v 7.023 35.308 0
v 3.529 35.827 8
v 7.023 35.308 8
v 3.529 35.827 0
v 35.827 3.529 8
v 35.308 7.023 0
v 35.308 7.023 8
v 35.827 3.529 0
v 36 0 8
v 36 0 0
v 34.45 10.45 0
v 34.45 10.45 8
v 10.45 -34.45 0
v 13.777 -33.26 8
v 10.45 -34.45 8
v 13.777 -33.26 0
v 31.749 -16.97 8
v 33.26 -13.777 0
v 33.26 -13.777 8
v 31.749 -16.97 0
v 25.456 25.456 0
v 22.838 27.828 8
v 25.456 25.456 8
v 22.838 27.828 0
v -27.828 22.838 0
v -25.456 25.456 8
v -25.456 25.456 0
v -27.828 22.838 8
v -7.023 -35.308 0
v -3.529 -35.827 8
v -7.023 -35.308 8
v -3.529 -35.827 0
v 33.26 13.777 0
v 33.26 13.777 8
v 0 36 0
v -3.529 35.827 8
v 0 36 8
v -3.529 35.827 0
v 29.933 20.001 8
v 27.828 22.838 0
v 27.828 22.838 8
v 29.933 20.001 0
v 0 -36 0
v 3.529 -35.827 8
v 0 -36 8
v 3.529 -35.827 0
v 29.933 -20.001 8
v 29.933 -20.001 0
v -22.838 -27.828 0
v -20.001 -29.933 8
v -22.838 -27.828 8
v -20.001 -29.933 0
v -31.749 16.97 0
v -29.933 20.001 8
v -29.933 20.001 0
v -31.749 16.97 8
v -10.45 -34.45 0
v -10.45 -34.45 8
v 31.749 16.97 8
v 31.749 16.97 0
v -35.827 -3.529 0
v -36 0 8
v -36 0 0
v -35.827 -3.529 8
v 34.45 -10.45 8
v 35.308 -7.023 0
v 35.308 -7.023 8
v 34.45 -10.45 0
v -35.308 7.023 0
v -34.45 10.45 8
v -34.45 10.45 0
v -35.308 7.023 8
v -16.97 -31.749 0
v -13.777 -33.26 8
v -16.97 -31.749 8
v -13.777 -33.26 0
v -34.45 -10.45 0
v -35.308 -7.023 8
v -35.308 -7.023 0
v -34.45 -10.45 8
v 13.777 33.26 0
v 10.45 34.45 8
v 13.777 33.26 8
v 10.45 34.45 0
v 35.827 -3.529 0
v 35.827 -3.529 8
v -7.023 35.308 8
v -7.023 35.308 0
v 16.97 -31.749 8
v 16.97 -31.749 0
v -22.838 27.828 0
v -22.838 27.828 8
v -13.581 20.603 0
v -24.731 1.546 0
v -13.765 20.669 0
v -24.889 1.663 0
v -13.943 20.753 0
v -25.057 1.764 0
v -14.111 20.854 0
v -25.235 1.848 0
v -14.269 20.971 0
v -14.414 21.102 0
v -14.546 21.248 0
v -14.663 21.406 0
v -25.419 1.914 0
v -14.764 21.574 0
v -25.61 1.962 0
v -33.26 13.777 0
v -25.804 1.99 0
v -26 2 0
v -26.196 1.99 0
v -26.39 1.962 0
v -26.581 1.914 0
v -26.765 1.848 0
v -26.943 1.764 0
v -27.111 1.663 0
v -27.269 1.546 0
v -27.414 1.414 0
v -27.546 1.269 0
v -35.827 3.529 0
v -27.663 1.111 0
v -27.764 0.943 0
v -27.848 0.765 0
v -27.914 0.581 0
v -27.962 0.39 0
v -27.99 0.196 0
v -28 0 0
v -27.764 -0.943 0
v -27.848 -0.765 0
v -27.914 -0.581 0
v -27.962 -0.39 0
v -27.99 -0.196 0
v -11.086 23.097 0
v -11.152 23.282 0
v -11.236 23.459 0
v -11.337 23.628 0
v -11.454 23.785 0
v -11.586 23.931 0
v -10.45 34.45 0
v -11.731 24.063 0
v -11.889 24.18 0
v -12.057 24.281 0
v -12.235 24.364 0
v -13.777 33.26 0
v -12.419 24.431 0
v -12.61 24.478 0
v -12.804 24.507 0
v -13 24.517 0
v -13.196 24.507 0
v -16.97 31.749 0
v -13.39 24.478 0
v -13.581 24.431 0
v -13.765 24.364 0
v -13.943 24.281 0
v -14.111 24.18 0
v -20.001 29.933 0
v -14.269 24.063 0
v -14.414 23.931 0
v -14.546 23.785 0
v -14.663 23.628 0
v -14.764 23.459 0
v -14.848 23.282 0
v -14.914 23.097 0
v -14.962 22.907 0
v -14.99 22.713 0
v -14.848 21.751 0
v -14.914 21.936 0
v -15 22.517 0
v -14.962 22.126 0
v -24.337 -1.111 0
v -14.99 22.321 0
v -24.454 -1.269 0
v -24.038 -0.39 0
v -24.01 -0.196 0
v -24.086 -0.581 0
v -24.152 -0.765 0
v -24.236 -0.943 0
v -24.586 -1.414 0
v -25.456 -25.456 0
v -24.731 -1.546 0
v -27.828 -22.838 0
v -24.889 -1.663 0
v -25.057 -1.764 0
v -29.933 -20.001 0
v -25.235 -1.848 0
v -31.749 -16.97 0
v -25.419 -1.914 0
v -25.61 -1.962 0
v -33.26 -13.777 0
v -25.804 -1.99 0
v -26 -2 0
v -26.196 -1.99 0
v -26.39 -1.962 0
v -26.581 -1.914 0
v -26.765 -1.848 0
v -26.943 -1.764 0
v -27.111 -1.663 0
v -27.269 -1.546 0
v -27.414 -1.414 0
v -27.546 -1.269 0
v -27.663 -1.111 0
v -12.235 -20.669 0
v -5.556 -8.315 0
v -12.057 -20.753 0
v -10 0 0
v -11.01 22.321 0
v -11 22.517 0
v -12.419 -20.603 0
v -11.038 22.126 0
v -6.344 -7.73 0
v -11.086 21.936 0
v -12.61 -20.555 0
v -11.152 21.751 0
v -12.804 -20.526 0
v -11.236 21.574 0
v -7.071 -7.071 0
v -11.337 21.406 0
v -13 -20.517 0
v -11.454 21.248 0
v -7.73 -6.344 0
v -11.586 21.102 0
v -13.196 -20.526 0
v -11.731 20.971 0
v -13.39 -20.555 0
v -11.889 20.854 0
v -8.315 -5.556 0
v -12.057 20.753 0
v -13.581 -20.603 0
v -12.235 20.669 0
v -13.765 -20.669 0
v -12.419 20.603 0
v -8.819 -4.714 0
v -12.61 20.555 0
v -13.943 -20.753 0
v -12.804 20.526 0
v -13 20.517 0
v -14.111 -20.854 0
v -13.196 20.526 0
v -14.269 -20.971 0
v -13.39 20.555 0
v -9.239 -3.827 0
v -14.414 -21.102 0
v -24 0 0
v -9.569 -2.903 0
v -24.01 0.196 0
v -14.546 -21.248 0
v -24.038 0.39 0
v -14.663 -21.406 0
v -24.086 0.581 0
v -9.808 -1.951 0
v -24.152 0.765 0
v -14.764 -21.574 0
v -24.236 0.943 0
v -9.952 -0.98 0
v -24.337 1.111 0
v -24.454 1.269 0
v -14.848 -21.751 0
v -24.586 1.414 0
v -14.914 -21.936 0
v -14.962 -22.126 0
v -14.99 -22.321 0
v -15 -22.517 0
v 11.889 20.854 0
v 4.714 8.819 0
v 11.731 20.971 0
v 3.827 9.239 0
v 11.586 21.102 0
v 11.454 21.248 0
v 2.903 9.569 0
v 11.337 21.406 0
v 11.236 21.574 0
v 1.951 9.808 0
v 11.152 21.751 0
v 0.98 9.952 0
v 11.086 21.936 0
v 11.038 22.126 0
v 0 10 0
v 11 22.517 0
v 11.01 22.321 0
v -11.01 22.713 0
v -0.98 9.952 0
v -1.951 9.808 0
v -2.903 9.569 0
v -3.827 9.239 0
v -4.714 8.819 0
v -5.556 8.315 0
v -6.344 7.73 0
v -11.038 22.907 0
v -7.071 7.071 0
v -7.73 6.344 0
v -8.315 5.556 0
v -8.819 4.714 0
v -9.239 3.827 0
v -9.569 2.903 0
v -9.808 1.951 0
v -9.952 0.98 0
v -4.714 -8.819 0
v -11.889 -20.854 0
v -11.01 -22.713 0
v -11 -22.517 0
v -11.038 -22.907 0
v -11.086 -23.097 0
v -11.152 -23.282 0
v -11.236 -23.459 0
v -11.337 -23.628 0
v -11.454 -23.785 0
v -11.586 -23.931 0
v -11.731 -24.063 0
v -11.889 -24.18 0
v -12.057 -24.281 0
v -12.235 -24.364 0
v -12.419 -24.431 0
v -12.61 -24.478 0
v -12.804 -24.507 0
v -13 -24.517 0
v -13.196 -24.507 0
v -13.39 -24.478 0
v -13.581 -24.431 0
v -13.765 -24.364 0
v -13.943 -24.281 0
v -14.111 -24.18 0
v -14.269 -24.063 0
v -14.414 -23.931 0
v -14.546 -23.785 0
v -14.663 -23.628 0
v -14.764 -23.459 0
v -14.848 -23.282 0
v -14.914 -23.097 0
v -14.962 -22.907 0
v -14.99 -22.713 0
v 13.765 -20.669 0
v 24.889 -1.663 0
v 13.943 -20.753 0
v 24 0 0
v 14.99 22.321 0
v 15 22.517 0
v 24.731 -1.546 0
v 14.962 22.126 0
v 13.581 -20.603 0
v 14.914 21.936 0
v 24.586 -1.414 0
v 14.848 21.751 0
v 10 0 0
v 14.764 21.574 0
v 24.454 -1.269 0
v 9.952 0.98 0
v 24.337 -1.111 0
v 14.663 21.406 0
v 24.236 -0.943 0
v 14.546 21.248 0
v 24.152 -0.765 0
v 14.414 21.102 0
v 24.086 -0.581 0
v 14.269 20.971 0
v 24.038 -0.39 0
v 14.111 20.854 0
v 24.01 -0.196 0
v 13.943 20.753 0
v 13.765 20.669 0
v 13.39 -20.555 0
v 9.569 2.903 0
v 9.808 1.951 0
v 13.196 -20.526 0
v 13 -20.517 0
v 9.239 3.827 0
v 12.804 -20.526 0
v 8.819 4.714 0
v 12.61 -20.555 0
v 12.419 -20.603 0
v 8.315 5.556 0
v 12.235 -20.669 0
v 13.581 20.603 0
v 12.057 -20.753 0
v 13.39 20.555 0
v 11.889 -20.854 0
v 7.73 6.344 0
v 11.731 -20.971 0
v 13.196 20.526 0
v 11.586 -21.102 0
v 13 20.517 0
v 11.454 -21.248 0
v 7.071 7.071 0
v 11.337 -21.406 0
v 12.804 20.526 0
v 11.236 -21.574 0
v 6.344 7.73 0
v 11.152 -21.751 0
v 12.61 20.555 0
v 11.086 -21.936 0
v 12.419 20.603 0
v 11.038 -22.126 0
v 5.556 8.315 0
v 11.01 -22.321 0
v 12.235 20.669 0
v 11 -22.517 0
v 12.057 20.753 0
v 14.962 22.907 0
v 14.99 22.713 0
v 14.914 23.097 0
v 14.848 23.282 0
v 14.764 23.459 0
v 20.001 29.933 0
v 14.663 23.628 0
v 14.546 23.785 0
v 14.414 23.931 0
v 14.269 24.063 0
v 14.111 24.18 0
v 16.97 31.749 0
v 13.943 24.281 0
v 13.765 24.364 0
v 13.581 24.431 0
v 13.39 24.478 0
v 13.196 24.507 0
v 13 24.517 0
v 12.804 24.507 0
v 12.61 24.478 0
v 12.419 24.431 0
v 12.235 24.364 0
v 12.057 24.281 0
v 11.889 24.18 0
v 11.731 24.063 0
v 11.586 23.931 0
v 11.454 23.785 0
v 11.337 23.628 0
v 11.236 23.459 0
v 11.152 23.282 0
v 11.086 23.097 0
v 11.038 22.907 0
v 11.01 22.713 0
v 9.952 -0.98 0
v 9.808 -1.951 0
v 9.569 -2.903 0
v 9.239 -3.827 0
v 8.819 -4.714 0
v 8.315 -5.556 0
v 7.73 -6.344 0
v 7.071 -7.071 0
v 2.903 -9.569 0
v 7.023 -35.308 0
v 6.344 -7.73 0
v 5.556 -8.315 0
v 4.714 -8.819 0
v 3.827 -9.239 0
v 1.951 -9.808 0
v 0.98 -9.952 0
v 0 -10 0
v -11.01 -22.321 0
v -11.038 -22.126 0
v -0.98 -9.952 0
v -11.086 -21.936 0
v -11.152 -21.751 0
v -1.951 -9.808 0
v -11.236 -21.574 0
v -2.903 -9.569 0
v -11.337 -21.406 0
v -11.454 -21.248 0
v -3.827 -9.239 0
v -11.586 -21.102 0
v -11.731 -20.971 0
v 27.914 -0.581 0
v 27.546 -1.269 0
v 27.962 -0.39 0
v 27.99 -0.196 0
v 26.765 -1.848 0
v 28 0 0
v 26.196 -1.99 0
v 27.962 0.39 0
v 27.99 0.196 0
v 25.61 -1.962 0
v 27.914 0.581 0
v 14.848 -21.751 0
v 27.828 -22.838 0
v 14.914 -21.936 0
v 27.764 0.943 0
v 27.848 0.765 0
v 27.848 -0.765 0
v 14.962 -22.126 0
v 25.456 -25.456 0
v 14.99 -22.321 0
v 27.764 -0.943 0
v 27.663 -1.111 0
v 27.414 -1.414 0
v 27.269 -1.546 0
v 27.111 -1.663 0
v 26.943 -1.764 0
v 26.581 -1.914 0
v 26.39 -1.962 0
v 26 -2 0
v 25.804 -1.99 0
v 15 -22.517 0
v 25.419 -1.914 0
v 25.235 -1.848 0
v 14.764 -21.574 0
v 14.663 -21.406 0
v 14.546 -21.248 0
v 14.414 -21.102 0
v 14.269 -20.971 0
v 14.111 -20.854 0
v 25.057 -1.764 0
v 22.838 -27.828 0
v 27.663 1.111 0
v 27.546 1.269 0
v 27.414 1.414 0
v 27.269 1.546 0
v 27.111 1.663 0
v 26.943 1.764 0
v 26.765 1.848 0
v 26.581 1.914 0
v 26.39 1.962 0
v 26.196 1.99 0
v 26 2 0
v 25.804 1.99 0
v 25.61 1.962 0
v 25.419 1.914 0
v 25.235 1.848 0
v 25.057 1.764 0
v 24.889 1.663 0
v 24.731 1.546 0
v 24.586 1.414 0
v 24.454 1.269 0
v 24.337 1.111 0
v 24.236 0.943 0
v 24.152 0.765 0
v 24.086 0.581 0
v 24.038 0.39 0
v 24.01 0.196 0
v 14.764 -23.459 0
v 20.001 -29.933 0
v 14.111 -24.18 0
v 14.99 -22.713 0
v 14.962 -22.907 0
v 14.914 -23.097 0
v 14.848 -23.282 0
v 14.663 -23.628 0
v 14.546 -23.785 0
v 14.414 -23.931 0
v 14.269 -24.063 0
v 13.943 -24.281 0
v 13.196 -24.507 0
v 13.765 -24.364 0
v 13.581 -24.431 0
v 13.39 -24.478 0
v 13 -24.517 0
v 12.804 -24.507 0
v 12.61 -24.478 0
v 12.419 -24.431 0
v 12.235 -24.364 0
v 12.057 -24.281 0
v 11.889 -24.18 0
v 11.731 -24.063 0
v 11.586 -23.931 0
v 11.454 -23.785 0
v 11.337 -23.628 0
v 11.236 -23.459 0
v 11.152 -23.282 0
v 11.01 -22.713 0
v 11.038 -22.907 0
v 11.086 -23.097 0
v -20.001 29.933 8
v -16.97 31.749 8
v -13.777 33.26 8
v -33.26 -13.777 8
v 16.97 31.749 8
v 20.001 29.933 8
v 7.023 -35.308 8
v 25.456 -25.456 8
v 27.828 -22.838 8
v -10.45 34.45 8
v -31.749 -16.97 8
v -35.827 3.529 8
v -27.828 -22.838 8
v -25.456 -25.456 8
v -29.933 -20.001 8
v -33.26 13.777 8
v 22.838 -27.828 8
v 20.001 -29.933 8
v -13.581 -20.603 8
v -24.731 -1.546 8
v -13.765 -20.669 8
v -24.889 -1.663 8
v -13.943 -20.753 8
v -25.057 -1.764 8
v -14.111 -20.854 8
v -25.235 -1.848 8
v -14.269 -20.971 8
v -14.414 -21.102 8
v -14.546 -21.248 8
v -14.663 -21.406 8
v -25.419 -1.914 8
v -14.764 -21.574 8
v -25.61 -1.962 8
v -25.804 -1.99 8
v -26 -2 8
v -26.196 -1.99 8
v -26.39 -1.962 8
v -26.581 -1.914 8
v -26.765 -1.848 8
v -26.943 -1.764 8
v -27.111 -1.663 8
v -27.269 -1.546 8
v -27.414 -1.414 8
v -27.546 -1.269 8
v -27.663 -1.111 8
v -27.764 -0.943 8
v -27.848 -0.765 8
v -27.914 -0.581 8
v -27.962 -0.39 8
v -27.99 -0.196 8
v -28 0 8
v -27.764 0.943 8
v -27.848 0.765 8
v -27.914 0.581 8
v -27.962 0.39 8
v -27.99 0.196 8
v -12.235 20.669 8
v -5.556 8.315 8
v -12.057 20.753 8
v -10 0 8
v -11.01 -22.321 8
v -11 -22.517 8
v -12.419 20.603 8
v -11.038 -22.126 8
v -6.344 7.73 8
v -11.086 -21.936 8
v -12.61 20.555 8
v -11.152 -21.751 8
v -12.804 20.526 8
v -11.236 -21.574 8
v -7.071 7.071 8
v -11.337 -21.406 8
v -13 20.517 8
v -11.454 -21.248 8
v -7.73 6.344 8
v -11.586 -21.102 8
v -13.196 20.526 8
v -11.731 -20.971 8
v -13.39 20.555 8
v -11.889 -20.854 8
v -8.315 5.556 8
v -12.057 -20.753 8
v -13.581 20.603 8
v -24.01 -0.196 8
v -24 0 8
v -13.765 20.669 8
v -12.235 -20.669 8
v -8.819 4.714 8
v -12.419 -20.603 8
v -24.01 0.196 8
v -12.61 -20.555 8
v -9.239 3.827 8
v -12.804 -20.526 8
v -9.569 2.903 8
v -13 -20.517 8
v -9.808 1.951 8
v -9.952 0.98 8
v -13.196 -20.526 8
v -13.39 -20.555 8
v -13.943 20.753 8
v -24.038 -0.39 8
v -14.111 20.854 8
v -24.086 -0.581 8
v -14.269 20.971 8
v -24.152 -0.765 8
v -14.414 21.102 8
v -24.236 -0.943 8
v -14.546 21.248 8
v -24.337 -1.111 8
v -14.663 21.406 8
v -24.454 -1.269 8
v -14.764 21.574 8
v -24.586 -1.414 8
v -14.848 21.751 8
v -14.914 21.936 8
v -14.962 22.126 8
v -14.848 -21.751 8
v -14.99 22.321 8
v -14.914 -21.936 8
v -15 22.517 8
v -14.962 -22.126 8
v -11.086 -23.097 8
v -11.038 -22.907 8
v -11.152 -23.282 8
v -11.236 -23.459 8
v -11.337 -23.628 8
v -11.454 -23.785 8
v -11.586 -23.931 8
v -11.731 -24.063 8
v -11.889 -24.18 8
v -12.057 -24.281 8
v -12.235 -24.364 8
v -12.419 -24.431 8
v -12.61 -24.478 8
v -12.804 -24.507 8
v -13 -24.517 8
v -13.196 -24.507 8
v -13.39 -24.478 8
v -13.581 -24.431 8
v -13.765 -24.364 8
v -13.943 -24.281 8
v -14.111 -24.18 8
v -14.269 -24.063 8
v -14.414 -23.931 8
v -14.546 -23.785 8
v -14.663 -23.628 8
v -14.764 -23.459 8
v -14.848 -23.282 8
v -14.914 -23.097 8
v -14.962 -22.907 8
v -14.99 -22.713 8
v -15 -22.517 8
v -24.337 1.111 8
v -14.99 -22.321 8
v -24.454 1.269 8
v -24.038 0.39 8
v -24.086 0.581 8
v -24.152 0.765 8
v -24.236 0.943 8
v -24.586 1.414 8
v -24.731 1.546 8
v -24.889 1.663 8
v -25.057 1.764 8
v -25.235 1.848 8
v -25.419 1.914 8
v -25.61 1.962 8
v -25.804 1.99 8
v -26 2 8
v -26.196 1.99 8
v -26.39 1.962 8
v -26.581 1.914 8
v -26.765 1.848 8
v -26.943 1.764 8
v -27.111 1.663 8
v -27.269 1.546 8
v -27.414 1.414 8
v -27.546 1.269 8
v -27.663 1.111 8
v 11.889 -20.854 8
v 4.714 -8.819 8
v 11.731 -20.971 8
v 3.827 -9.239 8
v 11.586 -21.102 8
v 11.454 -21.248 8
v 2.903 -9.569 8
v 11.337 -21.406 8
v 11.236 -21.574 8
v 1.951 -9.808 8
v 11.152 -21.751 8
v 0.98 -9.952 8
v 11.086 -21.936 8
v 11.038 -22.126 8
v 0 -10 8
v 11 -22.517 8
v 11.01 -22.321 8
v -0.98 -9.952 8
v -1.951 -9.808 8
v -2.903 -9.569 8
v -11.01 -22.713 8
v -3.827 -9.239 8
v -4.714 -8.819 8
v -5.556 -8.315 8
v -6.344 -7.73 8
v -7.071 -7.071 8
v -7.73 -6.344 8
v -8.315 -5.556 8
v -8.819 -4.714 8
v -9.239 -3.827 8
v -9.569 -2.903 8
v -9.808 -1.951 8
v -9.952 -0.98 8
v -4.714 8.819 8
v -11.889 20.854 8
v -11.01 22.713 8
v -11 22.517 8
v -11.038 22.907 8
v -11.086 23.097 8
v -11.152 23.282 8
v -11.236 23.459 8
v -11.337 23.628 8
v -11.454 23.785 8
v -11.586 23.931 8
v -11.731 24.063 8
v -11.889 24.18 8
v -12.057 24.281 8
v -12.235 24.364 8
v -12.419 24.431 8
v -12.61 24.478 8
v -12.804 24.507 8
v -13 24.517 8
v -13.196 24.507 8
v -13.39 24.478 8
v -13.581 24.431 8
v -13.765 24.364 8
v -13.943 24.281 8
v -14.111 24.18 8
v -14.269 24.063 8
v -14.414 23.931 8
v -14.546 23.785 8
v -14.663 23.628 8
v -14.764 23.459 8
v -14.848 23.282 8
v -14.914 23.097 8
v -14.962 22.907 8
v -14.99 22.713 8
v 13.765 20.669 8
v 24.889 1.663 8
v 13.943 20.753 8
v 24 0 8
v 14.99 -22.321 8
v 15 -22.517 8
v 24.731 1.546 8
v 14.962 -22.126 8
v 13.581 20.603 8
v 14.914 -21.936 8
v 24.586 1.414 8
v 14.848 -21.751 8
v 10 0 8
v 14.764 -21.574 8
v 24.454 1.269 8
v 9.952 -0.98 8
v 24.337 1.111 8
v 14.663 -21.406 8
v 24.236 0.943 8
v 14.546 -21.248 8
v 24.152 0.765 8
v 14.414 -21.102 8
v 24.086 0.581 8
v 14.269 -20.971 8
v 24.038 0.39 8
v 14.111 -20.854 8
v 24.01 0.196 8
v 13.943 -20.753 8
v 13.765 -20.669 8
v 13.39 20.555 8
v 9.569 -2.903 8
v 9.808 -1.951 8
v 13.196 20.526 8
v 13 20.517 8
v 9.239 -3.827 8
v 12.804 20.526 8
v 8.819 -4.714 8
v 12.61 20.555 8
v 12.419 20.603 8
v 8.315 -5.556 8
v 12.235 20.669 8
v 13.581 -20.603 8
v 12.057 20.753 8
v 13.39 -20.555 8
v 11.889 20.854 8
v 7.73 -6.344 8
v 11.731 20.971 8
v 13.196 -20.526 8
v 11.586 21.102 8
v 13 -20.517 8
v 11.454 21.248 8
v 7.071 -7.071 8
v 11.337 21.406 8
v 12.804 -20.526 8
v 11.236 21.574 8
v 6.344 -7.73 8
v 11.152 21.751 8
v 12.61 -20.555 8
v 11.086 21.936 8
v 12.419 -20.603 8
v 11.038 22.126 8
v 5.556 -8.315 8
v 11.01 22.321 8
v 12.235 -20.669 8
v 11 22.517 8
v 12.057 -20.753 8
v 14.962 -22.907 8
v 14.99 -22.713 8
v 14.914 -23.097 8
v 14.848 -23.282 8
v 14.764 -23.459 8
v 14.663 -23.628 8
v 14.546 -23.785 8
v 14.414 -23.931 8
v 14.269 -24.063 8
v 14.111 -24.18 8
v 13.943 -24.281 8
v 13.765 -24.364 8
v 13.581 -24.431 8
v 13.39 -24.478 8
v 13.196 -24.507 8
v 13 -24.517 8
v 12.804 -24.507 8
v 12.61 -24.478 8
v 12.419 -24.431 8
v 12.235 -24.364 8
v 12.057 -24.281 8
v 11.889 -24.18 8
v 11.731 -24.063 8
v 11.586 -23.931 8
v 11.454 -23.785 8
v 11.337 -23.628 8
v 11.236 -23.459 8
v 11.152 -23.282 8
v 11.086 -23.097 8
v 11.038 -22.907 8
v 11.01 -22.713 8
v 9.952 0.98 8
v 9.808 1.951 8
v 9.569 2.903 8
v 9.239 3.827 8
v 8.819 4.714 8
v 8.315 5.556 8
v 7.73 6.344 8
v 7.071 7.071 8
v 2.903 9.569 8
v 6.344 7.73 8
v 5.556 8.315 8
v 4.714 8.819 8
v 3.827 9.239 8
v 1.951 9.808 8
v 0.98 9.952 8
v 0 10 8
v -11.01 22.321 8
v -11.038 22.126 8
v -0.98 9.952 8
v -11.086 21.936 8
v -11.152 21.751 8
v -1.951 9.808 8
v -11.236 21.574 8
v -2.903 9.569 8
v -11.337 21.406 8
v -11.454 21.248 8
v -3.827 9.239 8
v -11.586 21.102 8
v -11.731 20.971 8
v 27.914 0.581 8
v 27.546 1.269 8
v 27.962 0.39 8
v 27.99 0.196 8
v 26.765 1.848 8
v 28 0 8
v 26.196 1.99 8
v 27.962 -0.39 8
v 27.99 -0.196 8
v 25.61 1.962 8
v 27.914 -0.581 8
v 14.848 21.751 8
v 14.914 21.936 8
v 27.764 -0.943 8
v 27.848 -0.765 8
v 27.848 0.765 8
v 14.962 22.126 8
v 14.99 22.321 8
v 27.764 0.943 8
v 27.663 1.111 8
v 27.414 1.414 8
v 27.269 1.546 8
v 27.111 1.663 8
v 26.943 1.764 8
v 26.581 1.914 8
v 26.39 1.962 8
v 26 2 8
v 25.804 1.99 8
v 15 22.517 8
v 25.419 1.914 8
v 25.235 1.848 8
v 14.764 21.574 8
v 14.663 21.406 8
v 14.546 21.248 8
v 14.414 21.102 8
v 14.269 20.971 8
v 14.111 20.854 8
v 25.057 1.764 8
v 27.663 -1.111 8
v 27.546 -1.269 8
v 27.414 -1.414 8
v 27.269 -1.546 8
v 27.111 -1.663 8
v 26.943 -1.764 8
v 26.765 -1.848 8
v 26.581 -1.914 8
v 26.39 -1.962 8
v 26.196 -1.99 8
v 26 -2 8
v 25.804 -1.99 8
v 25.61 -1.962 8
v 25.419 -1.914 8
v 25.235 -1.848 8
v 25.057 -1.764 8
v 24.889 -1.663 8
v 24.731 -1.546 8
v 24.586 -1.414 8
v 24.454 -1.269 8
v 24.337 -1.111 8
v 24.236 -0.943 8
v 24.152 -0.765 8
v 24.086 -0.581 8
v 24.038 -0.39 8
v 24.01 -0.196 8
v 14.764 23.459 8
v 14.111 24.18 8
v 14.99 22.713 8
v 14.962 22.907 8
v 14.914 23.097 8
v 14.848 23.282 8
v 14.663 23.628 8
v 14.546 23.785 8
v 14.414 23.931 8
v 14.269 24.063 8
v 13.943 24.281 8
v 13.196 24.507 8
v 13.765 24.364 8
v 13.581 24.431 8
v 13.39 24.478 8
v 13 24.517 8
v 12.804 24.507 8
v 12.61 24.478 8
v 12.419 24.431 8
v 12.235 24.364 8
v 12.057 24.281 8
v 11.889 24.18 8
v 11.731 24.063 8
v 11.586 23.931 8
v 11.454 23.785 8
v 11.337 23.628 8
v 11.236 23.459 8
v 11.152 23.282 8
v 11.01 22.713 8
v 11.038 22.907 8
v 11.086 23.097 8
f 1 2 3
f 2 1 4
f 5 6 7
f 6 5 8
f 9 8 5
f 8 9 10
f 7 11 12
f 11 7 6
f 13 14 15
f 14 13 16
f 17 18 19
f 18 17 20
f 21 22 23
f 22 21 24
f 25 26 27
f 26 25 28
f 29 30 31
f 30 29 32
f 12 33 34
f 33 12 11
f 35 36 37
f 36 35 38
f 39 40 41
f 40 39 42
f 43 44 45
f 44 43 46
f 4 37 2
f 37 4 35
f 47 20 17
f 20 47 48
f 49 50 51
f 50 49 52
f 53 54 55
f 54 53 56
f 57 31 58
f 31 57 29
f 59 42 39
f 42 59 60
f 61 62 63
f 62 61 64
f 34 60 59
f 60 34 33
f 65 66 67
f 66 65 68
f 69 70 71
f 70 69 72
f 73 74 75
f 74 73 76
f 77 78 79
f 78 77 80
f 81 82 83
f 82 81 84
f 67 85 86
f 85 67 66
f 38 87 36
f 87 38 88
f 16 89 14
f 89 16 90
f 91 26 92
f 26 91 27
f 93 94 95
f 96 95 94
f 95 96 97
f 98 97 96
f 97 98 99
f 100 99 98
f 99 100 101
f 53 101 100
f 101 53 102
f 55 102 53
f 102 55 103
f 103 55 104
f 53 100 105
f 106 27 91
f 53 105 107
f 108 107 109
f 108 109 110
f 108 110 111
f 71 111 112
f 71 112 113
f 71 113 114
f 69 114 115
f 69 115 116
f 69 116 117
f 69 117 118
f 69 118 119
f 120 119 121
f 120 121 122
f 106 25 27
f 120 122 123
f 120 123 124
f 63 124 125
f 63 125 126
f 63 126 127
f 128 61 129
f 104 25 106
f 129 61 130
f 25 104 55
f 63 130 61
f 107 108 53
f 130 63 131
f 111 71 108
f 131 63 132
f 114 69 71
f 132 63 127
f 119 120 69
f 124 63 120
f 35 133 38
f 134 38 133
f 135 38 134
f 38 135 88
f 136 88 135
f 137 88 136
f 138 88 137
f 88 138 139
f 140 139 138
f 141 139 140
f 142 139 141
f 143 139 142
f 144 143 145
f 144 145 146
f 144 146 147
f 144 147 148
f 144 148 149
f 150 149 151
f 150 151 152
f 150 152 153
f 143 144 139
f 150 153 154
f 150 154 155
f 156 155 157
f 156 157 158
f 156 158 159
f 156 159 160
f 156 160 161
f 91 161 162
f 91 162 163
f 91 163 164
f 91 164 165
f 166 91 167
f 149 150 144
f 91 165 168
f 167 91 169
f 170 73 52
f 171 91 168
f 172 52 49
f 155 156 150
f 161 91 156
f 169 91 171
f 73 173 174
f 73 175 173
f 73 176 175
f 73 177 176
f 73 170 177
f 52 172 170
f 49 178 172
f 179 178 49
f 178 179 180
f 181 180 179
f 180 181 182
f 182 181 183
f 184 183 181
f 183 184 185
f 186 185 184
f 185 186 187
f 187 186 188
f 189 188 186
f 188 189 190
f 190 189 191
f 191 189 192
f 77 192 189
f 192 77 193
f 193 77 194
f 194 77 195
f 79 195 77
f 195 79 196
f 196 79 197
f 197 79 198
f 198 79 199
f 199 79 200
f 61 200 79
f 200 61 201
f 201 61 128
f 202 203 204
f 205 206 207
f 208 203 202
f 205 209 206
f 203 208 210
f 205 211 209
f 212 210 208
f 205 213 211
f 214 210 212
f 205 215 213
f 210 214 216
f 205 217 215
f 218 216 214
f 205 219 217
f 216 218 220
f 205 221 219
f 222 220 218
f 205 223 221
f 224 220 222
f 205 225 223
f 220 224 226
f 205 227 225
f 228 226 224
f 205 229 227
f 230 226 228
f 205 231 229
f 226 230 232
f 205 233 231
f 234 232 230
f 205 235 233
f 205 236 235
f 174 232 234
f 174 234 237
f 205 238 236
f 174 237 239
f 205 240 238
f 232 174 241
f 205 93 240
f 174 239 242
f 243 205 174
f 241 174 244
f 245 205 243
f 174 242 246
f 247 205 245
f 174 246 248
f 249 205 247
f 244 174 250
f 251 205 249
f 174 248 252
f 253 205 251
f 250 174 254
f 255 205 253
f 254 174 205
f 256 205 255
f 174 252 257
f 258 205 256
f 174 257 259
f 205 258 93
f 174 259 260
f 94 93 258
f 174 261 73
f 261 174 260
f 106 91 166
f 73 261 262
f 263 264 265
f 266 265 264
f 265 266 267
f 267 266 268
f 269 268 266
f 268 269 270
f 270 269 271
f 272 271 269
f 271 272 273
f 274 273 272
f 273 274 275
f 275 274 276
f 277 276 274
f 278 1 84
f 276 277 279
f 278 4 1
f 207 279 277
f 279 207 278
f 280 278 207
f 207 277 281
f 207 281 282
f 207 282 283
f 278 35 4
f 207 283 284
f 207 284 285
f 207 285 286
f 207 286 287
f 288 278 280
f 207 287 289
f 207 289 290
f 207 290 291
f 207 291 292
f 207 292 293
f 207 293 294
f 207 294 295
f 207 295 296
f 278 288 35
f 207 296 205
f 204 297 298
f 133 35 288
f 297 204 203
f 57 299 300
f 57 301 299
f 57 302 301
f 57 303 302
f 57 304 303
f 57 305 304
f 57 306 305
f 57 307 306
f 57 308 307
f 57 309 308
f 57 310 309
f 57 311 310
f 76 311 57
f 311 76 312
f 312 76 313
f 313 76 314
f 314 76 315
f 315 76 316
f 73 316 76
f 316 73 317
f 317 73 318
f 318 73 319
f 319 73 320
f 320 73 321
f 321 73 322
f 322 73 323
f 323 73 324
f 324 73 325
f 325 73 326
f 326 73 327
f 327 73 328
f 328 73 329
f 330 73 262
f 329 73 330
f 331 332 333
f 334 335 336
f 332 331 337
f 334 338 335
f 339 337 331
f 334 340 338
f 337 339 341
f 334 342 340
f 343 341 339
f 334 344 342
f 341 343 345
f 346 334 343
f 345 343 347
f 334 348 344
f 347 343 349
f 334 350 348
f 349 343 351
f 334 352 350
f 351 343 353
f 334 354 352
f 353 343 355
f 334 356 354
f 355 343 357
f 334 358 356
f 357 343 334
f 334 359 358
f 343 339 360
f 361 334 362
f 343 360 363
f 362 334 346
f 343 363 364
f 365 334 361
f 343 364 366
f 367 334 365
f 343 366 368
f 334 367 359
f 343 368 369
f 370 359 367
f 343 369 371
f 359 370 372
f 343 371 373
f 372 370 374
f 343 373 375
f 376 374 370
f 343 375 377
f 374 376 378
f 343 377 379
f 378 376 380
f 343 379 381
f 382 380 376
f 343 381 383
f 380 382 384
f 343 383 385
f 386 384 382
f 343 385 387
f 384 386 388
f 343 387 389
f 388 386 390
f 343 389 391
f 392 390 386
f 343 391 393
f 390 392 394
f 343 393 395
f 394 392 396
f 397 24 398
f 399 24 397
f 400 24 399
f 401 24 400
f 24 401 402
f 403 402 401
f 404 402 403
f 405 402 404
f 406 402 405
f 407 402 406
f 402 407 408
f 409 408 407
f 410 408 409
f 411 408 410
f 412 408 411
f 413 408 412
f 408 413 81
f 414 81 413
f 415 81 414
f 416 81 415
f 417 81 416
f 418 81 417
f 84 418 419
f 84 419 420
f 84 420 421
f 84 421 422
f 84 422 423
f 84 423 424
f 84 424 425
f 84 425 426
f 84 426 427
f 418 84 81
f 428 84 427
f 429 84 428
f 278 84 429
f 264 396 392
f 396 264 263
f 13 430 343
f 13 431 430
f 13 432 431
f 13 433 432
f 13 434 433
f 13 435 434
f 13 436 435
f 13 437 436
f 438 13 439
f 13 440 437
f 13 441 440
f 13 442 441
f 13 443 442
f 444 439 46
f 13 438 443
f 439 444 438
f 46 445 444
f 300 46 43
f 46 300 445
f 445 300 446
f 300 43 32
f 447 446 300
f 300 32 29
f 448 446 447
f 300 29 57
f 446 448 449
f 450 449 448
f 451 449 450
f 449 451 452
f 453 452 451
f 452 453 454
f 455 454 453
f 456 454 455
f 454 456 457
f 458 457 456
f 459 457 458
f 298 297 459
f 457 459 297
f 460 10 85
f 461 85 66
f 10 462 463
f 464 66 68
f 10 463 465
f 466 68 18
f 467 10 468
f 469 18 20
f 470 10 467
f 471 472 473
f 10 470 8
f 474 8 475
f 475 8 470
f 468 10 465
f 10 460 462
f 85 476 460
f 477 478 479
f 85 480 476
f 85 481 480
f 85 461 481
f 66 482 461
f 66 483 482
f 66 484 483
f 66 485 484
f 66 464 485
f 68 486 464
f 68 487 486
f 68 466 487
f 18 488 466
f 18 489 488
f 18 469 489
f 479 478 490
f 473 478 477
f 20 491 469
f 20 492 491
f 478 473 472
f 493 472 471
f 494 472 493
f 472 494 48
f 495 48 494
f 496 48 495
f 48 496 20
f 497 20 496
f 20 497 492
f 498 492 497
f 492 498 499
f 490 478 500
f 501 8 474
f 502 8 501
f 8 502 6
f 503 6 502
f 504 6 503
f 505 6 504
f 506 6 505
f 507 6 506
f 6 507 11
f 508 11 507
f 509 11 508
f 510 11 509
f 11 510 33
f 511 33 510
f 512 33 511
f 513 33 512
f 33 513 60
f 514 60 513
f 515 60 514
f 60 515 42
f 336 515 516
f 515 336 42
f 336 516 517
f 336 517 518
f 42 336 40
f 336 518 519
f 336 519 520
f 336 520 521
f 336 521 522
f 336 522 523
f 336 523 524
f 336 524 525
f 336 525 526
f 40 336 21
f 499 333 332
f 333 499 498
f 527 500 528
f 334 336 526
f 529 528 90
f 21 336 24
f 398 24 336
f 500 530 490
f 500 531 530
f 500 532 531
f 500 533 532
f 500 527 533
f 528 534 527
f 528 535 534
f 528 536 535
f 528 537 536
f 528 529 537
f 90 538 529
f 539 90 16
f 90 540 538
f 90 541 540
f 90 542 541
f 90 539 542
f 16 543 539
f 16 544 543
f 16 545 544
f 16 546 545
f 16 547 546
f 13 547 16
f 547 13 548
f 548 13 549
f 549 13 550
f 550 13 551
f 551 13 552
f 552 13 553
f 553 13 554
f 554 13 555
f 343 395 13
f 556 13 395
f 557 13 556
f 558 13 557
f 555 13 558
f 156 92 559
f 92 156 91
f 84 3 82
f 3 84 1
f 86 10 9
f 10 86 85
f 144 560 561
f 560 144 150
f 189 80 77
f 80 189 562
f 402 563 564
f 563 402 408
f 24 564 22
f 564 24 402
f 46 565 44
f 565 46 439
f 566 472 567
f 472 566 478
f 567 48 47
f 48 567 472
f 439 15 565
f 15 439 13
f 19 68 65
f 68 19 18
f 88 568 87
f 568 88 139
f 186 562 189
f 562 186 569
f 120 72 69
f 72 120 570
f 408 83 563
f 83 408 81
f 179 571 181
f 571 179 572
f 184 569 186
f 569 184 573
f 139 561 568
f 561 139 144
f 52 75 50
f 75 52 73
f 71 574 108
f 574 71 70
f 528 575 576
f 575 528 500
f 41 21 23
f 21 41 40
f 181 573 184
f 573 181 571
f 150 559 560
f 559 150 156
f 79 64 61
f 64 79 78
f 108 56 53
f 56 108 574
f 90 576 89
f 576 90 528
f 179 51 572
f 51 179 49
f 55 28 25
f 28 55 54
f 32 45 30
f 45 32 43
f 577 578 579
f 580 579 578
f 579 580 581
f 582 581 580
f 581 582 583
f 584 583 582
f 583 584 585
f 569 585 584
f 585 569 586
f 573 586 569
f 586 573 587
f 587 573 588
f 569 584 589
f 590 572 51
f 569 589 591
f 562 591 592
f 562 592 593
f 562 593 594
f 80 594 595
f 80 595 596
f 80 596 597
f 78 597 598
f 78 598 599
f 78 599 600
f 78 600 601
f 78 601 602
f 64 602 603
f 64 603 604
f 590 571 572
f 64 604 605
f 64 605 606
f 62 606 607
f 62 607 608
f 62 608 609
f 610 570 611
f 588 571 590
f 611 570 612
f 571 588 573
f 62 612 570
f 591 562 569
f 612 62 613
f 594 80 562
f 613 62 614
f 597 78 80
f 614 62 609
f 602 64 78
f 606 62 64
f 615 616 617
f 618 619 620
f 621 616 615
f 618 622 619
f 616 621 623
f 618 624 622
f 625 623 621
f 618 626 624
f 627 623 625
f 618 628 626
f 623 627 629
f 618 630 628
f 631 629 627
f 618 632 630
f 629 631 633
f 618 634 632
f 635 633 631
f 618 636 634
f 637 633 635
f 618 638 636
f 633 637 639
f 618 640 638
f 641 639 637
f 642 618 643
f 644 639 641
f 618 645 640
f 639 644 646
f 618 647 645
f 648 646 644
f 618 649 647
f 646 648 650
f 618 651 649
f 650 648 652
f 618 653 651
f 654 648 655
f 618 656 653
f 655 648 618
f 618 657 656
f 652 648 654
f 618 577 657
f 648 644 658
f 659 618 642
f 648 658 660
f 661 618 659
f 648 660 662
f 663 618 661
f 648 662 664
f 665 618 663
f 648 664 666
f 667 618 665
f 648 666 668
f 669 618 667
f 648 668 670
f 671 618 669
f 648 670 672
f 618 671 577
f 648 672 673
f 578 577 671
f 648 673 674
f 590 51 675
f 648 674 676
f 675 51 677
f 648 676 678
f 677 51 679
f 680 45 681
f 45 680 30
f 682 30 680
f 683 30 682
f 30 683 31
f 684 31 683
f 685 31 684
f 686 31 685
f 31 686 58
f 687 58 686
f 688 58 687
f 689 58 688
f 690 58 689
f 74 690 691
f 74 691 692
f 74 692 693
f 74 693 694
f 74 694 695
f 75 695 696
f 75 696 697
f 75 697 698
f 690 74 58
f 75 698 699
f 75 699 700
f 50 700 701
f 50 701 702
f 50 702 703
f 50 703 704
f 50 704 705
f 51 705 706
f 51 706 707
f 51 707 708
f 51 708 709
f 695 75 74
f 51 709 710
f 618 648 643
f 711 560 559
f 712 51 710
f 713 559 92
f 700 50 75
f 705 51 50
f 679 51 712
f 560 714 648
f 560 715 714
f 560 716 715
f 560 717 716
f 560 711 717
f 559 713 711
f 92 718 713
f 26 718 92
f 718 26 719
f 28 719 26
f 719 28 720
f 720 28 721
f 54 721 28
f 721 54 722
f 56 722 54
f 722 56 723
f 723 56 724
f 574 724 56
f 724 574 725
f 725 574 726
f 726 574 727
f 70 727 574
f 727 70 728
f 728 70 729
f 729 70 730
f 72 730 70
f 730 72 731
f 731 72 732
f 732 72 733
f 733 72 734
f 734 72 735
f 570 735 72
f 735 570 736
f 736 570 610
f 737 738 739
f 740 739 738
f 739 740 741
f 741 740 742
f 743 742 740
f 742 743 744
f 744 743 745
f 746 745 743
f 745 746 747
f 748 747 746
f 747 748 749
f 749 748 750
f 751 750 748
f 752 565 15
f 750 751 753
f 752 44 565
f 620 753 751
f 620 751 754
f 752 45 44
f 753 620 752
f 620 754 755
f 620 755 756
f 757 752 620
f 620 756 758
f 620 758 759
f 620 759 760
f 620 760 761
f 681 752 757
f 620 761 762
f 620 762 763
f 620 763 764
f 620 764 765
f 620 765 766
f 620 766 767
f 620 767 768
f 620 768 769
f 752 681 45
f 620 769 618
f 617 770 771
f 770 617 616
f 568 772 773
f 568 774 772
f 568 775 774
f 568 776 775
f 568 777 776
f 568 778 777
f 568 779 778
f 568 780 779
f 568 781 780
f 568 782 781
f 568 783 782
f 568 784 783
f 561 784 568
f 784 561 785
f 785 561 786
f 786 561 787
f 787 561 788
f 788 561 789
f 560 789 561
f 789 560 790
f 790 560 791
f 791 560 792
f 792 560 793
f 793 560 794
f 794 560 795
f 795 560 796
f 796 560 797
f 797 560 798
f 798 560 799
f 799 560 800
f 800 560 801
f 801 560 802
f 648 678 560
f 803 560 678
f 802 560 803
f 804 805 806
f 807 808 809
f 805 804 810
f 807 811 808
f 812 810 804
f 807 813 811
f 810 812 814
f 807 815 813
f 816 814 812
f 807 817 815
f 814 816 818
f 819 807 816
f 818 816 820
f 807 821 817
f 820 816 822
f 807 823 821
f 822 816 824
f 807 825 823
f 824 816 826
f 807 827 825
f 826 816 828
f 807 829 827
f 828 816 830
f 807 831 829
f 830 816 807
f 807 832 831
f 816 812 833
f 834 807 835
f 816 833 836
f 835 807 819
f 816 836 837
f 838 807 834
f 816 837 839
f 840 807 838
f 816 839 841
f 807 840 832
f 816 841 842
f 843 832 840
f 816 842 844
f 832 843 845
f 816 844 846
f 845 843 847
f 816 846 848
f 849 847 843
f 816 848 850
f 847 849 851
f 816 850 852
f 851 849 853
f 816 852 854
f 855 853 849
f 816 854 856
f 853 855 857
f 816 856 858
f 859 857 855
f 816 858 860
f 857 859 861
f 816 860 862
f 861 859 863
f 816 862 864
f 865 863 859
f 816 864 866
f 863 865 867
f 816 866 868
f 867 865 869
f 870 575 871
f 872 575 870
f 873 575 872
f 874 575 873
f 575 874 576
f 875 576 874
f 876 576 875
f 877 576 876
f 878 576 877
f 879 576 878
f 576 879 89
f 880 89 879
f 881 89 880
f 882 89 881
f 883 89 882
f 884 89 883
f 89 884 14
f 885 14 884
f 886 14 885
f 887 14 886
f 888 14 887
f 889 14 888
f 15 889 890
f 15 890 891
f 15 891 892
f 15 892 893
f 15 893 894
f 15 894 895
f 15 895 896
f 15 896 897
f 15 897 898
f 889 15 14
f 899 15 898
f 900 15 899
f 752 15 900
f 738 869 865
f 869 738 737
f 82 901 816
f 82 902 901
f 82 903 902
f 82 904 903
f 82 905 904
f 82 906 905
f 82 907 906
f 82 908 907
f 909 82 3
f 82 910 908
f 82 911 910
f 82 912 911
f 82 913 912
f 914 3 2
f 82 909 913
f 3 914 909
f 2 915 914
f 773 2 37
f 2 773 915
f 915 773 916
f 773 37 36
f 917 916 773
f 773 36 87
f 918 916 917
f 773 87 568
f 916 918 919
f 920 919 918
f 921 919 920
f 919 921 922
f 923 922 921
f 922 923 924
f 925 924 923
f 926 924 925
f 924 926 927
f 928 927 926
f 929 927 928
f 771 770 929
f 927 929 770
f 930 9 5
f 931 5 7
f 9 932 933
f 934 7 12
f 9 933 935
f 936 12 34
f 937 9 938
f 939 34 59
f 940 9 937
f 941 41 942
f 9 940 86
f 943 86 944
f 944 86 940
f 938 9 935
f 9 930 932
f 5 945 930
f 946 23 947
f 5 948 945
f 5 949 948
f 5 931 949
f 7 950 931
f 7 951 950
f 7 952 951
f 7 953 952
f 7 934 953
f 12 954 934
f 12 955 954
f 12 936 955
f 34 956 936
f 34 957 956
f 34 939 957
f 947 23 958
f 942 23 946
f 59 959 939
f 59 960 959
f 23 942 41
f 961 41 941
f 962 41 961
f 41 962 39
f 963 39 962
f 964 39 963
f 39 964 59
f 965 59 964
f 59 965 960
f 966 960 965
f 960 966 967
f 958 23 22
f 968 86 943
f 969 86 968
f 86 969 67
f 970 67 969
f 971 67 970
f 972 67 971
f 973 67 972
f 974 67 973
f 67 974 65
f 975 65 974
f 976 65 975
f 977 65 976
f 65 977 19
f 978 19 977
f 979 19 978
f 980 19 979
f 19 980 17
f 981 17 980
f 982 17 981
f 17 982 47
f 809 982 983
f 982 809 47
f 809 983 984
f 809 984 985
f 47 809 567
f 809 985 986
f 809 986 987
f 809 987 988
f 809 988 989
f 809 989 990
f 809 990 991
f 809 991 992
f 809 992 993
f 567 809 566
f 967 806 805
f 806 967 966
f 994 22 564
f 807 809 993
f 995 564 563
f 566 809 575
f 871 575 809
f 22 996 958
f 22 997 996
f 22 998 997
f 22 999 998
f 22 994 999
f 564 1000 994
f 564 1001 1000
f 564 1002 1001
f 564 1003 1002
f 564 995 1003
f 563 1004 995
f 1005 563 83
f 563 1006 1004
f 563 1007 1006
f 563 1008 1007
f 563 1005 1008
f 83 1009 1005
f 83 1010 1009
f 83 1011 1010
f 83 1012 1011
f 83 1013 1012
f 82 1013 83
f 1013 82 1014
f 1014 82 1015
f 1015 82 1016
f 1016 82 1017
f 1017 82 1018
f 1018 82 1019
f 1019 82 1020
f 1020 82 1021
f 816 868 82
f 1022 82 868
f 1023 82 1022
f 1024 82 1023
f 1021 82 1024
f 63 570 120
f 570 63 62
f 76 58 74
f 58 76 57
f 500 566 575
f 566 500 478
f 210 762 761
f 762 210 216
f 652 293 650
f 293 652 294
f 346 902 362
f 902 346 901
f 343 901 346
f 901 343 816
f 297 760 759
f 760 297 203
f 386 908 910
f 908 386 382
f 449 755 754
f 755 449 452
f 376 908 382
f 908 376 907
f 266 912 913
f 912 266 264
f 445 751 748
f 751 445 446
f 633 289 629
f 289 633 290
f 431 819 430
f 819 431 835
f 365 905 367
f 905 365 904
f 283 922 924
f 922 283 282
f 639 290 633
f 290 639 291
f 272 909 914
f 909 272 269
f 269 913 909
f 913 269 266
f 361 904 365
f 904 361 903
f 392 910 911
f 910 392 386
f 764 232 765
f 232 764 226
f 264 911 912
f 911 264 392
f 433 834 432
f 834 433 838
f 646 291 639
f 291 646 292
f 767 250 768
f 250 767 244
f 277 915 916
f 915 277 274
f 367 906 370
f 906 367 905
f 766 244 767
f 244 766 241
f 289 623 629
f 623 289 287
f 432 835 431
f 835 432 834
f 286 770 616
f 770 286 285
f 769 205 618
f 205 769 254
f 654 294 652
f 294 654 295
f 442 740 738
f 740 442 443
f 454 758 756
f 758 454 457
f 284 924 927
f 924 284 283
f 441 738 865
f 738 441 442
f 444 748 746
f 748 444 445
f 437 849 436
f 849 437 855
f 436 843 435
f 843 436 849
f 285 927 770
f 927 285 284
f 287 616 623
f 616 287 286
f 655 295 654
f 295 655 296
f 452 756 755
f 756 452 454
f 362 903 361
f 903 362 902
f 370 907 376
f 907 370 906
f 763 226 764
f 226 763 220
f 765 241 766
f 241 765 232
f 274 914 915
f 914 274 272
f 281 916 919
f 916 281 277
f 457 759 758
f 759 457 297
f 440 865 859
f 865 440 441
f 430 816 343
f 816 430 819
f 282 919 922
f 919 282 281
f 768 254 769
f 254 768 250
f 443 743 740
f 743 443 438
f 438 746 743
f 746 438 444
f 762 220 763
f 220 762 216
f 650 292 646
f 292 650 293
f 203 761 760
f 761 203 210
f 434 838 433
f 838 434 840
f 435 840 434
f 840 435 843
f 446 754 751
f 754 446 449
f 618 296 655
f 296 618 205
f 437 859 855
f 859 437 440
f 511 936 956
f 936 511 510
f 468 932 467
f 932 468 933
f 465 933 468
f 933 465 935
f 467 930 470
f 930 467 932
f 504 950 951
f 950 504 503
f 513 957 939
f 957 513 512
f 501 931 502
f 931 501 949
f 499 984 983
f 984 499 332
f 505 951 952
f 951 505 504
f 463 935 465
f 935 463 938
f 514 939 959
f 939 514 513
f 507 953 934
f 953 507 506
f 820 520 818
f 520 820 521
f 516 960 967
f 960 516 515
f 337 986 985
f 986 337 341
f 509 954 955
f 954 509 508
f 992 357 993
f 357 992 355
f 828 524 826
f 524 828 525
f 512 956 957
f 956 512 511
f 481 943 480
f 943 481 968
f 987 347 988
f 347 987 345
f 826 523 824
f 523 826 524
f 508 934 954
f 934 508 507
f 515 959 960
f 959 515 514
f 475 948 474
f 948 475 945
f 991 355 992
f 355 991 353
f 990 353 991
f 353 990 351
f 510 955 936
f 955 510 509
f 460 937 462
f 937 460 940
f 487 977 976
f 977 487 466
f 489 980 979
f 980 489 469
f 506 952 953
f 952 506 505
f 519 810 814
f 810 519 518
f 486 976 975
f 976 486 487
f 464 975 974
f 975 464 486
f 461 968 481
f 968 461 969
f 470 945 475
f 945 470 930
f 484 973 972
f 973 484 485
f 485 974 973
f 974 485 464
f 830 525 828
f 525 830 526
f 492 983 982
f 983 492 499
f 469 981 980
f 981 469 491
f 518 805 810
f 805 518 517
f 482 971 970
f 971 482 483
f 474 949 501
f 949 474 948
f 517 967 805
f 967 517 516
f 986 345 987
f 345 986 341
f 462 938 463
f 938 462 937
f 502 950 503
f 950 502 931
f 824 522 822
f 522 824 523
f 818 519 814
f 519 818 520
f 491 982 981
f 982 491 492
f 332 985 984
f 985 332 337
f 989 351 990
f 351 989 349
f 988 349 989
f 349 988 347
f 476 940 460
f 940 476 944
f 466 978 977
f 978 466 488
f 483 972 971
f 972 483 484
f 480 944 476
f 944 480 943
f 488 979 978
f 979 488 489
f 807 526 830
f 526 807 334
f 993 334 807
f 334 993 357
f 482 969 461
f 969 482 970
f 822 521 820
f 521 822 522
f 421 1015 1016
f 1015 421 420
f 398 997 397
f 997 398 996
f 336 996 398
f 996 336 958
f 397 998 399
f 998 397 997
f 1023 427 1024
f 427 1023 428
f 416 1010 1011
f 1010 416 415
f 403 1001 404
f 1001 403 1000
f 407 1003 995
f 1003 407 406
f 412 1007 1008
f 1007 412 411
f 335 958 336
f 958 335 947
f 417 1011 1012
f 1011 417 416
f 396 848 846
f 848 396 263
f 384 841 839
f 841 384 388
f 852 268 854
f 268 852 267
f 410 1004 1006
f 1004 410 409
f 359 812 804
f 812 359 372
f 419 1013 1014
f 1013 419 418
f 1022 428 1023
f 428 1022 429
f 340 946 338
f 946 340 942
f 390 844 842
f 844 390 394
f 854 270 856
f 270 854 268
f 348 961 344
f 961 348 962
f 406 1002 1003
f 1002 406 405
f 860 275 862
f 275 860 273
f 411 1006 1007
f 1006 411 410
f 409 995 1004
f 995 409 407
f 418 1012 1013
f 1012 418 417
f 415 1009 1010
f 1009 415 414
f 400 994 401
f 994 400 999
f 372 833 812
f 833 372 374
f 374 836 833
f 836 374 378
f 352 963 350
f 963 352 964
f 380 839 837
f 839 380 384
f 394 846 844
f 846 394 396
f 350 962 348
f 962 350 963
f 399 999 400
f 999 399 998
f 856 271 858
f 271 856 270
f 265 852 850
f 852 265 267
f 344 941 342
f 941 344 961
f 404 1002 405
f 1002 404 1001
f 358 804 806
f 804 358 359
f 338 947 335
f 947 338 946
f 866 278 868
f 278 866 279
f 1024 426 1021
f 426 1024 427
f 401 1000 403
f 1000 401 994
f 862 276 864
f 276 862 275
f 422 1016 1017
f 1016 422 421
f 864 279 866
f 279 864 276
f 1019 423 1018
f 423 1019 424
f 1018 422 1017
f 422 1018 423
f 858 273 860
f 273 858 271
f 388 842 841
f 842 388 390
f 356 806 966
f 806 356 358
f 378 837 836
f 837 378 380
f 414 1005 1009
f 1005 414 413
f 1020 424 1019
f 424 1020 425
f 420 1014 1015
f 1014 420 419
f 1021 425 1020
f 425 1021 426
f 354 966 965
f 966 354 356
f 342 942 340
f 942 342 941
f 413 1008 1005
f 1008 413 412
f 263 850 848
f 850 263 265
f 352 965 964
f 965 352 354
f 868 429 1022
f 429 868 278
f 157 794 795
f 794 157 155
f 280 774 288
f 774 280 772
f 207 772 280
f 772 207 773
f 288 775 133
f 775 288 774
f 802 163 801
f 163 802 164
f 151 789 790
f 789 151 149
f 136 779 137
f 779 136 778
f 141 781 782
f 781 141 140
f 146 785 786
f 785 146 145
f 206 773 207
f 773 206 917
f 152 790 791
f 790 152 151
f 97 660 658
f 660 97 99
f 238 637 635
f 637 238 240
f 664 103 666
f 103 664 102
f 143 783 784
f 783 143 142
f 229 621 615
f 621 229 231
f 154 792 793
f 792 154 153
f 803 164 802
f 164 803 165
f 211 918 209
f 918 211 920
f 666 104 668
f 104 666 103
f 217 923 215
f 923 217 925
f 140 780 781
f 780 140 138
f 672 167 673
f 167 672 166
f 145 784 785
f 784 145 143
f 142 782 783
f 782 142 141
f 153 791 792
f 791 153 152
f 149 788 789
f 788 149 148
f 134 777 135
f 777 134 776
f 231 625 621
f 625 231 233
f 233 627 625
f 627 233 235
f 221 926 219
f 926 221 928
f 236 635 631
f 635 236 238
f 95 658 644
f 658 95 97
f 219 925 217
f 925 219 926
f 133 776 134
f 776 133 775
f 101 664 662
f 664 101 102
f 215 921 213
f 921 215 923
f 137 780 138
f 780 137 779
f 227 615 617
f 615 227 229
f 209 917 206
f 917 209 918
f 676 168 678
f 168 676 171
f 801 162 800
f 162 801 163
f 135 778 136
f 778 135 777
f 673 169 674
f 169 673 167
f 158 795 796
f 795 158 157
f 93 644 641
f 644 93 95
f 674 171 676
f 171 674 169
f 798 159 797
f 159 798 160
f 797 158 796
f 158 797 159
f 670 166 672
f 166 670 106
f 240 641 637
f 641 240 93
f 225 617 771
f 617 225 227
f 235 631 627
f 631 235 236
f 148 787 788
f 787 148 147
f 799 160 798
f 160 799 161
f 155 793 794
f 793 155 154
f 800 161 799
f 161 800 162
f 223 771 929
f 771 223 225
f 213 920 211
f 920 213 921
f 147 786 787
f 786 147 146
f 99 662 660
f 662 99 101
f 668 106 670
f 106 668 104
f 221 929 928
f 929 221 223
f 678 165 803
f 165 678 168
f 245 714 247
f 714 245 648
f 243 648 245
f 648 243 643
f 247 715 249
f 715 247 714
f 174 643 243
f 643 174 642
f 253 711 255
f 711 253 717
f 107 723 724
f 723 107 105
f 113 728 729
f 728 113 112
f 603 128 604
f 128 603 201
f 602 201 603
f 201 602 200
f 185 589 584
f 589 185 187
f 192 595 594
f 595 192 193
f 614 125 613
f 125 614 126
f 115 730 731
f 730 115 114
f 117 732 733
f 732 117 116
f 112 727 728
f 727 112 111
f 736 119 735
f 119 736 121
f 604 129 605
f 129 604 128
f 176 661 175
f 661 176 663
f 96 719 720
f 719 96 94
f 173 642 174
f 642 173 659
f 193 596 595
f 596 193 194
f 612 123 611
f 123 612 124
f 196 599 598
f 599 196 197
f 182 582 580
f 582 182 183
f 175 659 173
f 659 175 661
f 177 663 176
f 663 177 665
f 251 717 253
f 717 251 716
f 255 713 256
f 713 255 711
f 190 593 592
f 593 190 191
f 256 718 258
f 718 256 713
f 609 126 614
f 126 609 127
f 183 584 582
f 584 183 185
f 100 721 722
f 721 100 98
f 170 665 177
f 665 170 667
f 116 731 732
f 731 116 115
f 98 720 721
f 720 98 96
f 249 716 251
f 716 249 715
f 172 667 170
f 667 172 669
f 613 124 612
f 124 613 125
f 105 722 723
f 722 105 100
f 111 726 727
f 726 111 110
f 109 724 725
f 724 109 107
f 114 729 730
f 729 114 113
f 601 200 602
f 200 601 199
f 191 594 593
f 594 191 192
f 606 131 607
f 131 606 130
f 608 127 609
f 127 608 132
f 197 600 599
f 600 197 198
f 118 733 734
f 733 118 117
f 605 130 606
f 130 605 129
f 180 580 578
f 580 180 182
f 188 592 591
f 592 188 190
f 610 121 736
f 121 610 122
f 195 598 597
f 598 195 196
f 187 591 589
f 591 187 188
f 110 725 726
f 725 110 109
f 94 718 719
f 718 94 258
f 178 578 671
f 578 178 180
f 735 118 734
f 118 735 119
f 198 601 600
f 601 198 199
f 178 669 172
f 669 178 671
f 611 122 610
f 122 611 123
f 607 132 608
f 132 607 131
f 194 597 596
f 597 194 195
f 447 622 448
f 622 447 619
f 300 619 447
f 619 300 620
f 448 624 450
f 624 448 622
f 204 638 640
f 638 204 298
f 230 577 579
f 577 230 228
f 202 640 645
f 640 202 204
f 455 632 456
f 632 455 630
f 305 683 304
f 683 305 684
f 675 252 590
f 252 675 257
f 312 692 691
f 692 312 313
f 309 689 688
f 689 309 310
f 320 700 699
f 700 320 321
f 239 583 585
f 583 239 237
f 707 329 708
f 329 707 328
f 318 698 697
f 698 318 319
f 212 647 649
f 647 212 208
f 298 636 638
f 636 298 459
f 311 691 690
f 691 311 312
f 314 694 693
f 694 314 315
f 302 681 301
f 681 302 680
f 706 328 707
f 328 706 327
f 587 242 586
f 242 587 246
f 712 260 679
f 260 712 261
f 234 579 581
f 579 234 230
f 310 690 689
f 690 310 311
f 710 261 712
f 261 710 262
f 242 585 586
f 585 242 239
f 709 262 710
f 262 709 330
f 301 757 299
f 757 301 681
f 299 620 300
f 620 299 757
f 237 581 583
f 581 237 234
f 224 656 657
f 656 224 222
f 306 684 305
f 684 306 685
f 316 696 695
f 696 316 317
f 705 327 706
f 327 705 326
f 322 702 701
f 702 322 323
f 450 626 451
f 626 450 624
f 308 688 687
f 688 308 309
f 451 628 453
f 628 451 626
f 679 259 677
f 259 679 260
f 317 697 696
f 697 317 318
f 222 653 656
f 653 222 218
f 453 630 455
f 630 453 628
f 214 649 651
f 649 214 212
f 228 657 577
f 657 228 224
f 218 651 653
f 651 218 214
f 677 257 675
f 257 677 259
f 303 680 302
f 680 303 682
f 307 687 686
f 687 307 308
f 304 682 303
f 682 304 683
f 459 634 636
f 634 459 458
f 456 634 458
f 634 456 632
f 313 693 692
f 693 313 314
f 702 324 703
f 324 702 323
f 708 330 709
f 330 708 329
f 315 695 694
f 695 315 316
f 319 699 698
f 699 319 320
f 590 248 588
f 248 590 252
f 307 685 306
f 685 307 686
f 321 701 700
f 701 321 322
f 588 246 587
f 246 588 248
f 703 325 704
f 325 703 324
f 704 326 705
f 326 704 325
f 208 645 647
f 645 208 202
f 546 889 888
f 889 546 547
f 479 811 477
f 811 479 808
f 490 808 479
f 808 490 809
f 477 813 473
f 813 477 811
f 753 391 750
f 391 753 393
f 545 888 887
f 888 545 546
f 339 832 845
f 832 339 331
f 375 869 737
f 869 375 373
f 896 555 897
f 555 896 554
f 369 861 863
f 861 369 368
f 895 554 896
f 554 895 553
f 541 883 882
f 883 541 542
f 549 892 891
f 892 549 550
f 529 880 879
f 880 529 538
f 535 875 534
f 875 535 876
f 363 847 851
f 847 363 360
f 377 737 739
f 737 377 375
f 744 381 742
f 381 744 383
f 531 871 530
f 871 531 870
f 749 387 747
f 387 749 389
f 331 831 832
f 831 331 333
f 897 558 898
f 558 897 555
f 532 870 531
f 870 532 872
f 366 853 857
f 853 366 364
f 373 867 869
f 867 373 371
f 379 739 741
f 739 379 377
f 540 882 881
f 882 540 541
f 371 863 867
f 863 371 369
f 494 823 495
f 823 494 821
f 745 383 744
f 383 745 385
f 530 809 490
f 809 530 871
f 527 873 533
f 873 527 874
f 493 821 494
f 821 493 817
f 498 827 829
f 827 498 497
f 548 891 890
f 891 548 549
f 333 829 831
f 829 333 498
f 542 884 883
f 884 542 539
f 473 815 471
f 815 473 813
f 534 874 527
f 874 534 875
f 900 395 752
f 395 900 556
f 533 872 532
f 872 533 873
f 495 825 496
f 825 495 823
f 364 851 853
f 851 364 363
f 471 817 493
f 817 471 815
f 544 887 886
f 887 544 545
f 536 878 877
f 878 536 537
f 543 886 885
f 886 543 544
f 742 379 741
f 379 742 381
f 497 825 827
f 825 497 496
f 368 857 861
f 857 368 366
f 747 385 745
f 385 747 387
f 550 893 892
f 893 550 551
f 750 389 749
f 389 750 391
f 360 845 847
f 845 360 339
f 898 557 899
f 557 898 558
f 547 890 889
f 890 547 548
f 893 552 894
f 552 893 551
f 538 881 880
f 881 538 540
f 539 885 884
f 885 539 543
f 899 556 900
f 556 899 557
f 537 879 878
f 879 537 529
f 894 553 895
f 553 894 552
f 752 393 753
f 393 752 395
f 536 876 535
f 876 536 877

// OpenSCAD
// Generated with SolidPython2 for OpenSCAD task-003
$fn = 64;

difference() {
	translate(v = [0, 0, 0]) {
		cylinder(h = 8, r = 36.0);
	}
	translate(v = [0, 0, -1]) {
		cylinder(h = 10, r = 10.0);
	}
	translate(v = [26.0, 0.0, -1]) {
		cylinder(h = 10, r = 2.0);
	}
	translate(v = [13.000000000000004, 22.516660498395403, -1]) {
		cylinder(h = 10, r = 2.0);
	}
	translate(v = [-12.999999999999995, 22.516660498395407, -1]) {
		cylinder(h = 10, r = 2.0);
	}
	translate(v = [-26.0, 3.184081677783118e-15, -1]) {
		cylinder(h = 10, r = 2.0);
	}
	translate(v = [-13.00000000000001, -22.5166604983954, -1]) {
		cylinder(h = 10, r = 2.0);
	}
	translate(v = [13.000000000000004, -22.516660498395403, -1]) {
		cylinder(h = 10, r = 2.0);
	}
}
